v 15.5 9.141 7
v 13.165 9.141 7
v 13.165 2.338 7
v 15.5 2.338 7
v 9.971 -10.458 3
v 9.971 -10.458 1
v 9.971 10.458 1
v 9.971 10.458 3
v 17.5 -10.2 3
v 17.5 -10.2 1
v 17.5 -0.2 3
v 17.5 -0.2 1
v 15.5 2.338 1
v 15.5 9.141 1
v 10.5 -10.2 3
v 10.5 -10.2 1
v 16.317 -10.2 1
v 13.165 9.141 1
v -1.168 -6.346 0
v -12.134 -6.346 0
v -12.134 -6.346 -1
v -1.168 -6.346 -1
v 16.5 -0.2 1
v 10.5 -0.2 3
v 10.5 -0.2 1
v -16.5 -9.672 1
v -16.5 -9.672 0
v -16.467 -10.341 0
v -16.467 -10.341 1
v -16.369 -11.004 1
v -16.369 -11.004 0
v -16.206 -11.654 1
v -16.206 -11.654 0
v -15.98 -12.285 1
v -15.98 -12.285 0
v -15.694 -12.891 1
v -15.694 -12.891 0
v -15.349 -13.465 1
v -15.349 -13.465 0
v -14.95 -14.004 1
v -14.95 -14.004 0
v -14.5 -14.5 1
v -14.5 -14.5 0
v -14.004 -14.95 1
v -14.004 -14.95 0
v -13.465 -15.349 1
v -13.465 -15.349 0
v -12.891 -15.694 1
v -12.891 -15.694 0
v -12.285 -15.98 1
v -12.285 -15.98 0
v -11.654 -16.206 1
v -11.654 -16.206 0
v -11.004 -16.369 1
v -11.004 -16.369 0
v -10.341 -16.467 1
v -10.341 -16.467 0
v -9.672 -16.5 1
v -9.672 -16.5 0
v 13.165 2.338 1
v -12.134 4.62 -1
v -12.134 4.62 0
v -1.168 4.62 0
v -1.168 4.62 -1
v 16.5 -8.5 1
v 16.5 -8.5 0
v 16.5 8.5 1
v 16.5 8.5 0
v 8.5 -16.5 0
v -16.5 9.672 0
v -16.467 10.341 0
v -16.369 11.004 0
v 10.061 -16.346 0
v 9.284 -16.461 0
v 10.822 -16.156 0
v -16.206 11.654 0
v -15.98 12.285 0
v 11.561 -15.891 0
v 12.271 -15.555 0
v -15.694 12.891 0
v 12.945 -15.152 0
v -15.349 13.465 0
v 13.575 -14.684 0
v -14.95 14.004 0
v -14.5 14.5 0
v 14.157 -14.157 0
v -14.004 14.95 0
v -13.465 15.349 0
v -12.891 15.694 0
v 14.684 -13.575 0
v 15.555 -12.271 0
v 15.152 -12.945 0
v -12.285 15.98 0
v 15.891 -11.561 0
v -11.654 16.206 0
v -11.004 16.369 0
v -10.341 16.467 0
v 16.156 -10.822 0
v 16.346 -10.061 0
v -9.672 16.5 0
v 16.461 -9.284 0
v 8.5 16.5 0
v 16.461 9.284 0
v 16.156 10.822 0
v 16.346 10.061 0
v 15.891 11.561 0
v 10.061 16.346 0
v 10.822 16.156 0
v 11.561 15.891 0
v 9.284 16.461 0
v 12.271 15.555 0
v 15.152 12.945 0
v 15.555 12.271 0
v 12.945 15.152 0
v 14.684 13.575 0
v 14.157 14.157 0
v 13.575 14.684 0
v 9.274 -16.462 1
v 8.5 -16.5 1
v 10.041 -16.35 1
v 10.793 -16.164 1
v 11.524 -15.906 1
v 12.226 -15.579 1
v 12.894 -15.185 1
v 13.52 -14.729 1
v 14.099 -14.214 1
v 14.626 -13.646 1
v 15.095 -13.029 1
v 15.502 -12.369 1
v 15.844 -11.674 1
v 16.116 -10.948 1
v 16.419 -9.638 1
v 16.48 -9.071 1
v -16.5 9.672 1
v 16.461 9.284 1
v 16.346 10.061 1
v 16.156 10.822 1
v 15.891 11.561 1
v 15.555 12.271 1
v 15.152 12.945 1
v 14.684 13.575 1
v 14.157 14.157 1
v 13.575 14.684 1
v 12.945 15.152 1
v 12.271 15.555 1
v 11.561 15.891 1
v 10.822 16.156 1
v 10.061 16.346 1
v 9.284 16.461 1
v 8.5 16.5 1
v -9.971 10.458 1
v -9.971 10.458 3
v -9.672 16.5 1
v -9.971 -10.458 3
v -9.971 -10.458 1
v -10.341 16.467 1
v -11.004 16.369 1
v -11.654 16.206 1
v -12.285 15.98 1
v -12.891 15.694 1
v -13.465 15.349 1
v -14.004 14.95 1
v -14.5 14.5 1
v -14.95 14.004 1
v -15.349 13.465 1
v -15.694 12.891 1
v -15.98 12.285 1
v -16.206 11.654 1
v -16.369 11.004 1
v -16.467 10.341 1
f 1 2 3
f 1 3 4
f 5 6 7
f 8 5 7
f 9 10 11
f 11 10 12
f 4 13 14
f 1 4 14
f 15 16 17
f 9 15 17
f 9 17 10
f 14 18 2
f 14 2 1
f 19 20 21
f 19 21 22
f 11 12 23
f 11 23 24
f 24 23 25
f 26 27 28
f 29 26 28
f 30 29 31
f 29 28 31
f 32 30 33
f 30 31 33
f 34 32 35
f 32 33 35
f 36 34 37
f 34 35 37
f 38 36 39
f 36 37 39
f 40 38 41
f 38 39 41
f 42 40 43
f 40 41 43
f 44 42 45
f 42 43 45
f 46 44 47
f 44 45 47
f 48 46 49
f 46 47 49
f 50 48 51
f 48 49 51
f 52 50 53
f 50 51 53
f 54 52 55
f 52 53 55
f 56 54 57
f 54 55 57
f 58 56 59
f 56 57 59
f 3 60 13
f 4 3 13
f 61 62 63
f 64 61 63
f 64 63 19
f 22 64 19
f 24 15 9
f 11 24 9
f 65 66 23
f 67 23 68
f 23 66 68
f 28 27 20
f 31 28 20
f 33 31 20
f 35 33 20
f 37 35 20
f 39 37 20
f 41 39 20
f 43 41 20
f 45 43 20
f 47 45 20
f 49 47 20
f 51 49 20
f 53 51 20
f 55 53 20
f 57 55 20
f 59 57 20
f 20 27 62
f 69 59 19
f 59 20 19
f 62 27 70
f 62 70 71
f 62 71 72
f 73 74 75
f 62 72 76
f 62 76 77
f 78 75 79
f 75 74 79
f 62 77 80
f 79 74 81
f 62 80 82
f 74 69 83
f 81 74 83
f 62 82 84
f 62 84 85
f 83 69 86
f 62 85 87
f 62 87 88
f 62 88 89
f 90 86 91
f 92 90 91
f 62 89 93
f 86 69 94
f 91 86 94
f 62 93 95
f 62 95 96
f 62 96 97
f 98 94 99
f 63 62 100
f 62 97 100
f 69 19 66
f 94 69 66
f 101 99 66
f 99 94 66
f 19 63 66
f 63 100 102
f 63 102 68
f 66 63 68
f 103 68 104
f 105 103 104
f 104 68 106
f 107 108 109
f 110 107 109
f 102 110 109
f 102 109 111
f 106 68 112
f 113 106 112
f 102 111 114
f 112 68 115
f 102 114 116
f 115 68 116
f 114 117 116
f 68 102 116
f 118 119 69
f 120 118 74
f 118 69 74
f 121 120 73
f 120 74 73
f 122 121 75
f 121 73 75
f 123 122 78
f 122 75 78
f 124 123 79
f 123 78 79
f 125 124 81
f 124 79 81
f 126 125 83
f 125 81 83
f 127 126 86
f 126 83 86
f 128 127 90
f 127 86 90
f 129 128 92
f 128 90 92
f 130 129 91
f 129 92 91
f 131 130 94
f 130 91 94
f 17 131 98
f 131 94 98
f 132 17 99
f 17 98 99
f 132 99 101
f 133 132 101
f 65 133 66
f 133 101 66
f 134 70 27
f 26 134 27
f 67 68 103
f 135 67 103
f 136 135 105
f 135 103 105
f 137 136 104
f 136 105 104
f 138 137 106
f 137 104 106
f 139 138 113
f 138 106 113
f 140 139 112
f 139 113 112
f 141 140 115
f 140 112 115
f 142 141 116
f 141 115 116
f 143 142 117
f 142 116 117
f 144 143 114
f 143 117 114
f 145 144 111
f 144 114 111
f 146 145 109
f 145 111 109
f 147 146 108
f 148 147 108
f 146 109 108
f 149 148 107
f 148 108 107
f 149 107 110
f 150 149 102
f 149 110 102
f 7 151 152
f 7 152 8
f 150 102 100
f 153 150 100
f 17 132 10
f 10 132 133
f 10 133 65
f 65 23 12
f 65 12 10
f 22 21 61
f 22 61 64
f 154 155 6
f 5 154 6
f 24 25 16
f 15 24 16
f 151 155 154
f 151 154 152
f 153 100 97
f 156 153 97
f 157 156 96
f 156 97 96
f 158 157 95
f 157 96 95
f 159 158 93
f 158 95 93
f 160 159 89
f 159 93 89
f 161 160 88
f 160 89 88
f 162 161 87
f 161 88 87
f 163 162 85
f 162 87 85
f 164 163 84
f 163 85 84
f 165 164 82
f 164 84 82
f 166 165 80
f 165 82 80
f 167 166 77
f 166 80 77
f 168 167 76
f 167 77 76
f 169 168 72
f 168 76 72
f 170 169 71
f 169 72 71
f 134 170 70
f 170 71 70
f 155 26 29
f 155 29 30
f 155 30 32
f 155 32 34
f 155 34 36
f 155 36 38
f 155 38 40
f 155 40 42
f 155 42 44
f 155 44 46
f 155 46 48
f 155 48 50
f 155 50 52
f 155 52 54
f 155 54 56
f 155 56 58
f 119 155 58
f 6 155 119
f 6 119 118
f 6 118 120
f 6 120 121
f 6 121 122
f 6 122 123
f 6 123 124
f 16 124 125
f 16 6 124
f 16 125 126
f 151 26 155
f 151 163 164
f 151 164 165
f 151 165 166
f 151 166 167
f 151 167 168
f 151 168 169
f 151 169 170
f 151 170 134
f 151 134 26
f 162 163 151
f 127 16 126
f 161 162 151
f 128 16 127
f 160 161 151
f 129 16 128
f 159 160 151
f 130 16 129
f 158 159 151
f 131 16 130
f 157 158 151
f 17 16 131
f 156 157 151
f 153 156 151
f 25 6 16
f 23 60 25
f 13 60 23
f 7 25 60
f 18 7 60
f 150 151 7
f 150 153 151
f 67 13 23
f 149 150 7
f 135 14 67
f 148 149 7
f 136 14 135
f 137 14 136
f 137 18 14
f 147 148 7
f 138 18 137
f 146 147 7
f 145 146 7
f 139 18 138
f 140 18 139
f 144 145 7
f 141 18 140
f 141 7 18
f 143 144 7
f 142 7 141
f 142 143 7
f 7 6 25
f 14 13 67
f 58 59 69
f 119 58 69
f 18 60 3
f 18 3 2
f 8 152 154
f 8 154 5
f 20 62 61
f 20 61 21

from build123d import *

# Parameters (mm, degrees)
F1_DEPTH = 1
F3_DEPTH = 2
F4_W     = 19.942
F4_H     = 20.917
F5_DEPTH = 2
F2_W     = 2.335
F2_H     = 6.803
F6_DEPTH = 6
F7_W     = 10.966
F7_H     = 10.966
F8_DEPTH = 1


with BuildPart() as f1:
    # F0 (on Top) → F1 (new body)
    with BuildSketch(Plane.XY):
        with BuildLine():
            Line((-9.672, -16.5), (8.5, -16.5))
            ThreePointArc((8.5, -16.5), (14.156854, -14.156854), (16.5, -8.5))
            Line((16.5, -8.5), (16.5, 8.5))
            ThreePointArc((16.5, 8.5), (14.156854, 14.156854), (8.5, 16.5))
            Line((8.5, 16.5), (-9.672, 16.5))
            ThreePointArc((-9.672, 16.5), (-14.500125, 14.500125), (-16.5, 9.672))
            Line((-16.5, 9.672), (-16.5, -9.672))
            ThreePointArc((-16.5, -9.672), (-14.500125, -14.500125), (-9.672, -16.5))
        make_face()
    extrude(amount=F1_DEPTH)

    # F2 (on face) → F3 (join)
    with BuildSketch(Plane.XY.offset(1)):
        with BuildLine():
            Line((16.317289, -10.2), (17.5, -10.2))
            Line((17.5, -10.2), (17.5, -0.2))
            Line((17.5, -0.2), (16.5, -0.2))
            Line((16.5, -0.2), (16.5, -8.5))
            ThreePointArc((16.5, -8.5), (16.454191, -9.354895), (16.317289, -10.2))
        make_face()
        with BuildLine():
            Line((10.5, -10.2), (16.317289, -10.2))
            ThreePointArc((16.317289, -10.2), (16.454191, -9.354895), (16.5, -8.5))
            Line((16.5, -8.5), (16.5, -0.2))
            Line((16.5, -0.2), (10.5, -0.2))
            Line((10.5, -0.2), (10.5, -10.2))
        make_face()
    extrude(amount=F3_DEPTH)

    # F4 (on face) → F5 (join)
    with BuildSketch(Plane.XY.offset(1)):
        Rectangle(F4_W, F4_H)
    extrude(amount=F5_DEPTH)

    # F2 (on face) → F6 (join)
    with BuildSketch(Plane.XY.offset(1)):
        with Locations((14.3325, 5.7395)):
            Rectangle(F2_W, F2_H)
    extrude(amount=F6_DEPTH)

    # F7 (on face) → F8 (join)
    with BuildSketch(Plane(origin=(0, 0, 0), x_dir=(1, 0, 0), z_dir=(0, 0, -1))):
        with Locations((-6.651, 0.863)):
            Rectangle(F7_W, F7_H)
    extrude(amount=F8_DEPTH)


solid = f1.part
